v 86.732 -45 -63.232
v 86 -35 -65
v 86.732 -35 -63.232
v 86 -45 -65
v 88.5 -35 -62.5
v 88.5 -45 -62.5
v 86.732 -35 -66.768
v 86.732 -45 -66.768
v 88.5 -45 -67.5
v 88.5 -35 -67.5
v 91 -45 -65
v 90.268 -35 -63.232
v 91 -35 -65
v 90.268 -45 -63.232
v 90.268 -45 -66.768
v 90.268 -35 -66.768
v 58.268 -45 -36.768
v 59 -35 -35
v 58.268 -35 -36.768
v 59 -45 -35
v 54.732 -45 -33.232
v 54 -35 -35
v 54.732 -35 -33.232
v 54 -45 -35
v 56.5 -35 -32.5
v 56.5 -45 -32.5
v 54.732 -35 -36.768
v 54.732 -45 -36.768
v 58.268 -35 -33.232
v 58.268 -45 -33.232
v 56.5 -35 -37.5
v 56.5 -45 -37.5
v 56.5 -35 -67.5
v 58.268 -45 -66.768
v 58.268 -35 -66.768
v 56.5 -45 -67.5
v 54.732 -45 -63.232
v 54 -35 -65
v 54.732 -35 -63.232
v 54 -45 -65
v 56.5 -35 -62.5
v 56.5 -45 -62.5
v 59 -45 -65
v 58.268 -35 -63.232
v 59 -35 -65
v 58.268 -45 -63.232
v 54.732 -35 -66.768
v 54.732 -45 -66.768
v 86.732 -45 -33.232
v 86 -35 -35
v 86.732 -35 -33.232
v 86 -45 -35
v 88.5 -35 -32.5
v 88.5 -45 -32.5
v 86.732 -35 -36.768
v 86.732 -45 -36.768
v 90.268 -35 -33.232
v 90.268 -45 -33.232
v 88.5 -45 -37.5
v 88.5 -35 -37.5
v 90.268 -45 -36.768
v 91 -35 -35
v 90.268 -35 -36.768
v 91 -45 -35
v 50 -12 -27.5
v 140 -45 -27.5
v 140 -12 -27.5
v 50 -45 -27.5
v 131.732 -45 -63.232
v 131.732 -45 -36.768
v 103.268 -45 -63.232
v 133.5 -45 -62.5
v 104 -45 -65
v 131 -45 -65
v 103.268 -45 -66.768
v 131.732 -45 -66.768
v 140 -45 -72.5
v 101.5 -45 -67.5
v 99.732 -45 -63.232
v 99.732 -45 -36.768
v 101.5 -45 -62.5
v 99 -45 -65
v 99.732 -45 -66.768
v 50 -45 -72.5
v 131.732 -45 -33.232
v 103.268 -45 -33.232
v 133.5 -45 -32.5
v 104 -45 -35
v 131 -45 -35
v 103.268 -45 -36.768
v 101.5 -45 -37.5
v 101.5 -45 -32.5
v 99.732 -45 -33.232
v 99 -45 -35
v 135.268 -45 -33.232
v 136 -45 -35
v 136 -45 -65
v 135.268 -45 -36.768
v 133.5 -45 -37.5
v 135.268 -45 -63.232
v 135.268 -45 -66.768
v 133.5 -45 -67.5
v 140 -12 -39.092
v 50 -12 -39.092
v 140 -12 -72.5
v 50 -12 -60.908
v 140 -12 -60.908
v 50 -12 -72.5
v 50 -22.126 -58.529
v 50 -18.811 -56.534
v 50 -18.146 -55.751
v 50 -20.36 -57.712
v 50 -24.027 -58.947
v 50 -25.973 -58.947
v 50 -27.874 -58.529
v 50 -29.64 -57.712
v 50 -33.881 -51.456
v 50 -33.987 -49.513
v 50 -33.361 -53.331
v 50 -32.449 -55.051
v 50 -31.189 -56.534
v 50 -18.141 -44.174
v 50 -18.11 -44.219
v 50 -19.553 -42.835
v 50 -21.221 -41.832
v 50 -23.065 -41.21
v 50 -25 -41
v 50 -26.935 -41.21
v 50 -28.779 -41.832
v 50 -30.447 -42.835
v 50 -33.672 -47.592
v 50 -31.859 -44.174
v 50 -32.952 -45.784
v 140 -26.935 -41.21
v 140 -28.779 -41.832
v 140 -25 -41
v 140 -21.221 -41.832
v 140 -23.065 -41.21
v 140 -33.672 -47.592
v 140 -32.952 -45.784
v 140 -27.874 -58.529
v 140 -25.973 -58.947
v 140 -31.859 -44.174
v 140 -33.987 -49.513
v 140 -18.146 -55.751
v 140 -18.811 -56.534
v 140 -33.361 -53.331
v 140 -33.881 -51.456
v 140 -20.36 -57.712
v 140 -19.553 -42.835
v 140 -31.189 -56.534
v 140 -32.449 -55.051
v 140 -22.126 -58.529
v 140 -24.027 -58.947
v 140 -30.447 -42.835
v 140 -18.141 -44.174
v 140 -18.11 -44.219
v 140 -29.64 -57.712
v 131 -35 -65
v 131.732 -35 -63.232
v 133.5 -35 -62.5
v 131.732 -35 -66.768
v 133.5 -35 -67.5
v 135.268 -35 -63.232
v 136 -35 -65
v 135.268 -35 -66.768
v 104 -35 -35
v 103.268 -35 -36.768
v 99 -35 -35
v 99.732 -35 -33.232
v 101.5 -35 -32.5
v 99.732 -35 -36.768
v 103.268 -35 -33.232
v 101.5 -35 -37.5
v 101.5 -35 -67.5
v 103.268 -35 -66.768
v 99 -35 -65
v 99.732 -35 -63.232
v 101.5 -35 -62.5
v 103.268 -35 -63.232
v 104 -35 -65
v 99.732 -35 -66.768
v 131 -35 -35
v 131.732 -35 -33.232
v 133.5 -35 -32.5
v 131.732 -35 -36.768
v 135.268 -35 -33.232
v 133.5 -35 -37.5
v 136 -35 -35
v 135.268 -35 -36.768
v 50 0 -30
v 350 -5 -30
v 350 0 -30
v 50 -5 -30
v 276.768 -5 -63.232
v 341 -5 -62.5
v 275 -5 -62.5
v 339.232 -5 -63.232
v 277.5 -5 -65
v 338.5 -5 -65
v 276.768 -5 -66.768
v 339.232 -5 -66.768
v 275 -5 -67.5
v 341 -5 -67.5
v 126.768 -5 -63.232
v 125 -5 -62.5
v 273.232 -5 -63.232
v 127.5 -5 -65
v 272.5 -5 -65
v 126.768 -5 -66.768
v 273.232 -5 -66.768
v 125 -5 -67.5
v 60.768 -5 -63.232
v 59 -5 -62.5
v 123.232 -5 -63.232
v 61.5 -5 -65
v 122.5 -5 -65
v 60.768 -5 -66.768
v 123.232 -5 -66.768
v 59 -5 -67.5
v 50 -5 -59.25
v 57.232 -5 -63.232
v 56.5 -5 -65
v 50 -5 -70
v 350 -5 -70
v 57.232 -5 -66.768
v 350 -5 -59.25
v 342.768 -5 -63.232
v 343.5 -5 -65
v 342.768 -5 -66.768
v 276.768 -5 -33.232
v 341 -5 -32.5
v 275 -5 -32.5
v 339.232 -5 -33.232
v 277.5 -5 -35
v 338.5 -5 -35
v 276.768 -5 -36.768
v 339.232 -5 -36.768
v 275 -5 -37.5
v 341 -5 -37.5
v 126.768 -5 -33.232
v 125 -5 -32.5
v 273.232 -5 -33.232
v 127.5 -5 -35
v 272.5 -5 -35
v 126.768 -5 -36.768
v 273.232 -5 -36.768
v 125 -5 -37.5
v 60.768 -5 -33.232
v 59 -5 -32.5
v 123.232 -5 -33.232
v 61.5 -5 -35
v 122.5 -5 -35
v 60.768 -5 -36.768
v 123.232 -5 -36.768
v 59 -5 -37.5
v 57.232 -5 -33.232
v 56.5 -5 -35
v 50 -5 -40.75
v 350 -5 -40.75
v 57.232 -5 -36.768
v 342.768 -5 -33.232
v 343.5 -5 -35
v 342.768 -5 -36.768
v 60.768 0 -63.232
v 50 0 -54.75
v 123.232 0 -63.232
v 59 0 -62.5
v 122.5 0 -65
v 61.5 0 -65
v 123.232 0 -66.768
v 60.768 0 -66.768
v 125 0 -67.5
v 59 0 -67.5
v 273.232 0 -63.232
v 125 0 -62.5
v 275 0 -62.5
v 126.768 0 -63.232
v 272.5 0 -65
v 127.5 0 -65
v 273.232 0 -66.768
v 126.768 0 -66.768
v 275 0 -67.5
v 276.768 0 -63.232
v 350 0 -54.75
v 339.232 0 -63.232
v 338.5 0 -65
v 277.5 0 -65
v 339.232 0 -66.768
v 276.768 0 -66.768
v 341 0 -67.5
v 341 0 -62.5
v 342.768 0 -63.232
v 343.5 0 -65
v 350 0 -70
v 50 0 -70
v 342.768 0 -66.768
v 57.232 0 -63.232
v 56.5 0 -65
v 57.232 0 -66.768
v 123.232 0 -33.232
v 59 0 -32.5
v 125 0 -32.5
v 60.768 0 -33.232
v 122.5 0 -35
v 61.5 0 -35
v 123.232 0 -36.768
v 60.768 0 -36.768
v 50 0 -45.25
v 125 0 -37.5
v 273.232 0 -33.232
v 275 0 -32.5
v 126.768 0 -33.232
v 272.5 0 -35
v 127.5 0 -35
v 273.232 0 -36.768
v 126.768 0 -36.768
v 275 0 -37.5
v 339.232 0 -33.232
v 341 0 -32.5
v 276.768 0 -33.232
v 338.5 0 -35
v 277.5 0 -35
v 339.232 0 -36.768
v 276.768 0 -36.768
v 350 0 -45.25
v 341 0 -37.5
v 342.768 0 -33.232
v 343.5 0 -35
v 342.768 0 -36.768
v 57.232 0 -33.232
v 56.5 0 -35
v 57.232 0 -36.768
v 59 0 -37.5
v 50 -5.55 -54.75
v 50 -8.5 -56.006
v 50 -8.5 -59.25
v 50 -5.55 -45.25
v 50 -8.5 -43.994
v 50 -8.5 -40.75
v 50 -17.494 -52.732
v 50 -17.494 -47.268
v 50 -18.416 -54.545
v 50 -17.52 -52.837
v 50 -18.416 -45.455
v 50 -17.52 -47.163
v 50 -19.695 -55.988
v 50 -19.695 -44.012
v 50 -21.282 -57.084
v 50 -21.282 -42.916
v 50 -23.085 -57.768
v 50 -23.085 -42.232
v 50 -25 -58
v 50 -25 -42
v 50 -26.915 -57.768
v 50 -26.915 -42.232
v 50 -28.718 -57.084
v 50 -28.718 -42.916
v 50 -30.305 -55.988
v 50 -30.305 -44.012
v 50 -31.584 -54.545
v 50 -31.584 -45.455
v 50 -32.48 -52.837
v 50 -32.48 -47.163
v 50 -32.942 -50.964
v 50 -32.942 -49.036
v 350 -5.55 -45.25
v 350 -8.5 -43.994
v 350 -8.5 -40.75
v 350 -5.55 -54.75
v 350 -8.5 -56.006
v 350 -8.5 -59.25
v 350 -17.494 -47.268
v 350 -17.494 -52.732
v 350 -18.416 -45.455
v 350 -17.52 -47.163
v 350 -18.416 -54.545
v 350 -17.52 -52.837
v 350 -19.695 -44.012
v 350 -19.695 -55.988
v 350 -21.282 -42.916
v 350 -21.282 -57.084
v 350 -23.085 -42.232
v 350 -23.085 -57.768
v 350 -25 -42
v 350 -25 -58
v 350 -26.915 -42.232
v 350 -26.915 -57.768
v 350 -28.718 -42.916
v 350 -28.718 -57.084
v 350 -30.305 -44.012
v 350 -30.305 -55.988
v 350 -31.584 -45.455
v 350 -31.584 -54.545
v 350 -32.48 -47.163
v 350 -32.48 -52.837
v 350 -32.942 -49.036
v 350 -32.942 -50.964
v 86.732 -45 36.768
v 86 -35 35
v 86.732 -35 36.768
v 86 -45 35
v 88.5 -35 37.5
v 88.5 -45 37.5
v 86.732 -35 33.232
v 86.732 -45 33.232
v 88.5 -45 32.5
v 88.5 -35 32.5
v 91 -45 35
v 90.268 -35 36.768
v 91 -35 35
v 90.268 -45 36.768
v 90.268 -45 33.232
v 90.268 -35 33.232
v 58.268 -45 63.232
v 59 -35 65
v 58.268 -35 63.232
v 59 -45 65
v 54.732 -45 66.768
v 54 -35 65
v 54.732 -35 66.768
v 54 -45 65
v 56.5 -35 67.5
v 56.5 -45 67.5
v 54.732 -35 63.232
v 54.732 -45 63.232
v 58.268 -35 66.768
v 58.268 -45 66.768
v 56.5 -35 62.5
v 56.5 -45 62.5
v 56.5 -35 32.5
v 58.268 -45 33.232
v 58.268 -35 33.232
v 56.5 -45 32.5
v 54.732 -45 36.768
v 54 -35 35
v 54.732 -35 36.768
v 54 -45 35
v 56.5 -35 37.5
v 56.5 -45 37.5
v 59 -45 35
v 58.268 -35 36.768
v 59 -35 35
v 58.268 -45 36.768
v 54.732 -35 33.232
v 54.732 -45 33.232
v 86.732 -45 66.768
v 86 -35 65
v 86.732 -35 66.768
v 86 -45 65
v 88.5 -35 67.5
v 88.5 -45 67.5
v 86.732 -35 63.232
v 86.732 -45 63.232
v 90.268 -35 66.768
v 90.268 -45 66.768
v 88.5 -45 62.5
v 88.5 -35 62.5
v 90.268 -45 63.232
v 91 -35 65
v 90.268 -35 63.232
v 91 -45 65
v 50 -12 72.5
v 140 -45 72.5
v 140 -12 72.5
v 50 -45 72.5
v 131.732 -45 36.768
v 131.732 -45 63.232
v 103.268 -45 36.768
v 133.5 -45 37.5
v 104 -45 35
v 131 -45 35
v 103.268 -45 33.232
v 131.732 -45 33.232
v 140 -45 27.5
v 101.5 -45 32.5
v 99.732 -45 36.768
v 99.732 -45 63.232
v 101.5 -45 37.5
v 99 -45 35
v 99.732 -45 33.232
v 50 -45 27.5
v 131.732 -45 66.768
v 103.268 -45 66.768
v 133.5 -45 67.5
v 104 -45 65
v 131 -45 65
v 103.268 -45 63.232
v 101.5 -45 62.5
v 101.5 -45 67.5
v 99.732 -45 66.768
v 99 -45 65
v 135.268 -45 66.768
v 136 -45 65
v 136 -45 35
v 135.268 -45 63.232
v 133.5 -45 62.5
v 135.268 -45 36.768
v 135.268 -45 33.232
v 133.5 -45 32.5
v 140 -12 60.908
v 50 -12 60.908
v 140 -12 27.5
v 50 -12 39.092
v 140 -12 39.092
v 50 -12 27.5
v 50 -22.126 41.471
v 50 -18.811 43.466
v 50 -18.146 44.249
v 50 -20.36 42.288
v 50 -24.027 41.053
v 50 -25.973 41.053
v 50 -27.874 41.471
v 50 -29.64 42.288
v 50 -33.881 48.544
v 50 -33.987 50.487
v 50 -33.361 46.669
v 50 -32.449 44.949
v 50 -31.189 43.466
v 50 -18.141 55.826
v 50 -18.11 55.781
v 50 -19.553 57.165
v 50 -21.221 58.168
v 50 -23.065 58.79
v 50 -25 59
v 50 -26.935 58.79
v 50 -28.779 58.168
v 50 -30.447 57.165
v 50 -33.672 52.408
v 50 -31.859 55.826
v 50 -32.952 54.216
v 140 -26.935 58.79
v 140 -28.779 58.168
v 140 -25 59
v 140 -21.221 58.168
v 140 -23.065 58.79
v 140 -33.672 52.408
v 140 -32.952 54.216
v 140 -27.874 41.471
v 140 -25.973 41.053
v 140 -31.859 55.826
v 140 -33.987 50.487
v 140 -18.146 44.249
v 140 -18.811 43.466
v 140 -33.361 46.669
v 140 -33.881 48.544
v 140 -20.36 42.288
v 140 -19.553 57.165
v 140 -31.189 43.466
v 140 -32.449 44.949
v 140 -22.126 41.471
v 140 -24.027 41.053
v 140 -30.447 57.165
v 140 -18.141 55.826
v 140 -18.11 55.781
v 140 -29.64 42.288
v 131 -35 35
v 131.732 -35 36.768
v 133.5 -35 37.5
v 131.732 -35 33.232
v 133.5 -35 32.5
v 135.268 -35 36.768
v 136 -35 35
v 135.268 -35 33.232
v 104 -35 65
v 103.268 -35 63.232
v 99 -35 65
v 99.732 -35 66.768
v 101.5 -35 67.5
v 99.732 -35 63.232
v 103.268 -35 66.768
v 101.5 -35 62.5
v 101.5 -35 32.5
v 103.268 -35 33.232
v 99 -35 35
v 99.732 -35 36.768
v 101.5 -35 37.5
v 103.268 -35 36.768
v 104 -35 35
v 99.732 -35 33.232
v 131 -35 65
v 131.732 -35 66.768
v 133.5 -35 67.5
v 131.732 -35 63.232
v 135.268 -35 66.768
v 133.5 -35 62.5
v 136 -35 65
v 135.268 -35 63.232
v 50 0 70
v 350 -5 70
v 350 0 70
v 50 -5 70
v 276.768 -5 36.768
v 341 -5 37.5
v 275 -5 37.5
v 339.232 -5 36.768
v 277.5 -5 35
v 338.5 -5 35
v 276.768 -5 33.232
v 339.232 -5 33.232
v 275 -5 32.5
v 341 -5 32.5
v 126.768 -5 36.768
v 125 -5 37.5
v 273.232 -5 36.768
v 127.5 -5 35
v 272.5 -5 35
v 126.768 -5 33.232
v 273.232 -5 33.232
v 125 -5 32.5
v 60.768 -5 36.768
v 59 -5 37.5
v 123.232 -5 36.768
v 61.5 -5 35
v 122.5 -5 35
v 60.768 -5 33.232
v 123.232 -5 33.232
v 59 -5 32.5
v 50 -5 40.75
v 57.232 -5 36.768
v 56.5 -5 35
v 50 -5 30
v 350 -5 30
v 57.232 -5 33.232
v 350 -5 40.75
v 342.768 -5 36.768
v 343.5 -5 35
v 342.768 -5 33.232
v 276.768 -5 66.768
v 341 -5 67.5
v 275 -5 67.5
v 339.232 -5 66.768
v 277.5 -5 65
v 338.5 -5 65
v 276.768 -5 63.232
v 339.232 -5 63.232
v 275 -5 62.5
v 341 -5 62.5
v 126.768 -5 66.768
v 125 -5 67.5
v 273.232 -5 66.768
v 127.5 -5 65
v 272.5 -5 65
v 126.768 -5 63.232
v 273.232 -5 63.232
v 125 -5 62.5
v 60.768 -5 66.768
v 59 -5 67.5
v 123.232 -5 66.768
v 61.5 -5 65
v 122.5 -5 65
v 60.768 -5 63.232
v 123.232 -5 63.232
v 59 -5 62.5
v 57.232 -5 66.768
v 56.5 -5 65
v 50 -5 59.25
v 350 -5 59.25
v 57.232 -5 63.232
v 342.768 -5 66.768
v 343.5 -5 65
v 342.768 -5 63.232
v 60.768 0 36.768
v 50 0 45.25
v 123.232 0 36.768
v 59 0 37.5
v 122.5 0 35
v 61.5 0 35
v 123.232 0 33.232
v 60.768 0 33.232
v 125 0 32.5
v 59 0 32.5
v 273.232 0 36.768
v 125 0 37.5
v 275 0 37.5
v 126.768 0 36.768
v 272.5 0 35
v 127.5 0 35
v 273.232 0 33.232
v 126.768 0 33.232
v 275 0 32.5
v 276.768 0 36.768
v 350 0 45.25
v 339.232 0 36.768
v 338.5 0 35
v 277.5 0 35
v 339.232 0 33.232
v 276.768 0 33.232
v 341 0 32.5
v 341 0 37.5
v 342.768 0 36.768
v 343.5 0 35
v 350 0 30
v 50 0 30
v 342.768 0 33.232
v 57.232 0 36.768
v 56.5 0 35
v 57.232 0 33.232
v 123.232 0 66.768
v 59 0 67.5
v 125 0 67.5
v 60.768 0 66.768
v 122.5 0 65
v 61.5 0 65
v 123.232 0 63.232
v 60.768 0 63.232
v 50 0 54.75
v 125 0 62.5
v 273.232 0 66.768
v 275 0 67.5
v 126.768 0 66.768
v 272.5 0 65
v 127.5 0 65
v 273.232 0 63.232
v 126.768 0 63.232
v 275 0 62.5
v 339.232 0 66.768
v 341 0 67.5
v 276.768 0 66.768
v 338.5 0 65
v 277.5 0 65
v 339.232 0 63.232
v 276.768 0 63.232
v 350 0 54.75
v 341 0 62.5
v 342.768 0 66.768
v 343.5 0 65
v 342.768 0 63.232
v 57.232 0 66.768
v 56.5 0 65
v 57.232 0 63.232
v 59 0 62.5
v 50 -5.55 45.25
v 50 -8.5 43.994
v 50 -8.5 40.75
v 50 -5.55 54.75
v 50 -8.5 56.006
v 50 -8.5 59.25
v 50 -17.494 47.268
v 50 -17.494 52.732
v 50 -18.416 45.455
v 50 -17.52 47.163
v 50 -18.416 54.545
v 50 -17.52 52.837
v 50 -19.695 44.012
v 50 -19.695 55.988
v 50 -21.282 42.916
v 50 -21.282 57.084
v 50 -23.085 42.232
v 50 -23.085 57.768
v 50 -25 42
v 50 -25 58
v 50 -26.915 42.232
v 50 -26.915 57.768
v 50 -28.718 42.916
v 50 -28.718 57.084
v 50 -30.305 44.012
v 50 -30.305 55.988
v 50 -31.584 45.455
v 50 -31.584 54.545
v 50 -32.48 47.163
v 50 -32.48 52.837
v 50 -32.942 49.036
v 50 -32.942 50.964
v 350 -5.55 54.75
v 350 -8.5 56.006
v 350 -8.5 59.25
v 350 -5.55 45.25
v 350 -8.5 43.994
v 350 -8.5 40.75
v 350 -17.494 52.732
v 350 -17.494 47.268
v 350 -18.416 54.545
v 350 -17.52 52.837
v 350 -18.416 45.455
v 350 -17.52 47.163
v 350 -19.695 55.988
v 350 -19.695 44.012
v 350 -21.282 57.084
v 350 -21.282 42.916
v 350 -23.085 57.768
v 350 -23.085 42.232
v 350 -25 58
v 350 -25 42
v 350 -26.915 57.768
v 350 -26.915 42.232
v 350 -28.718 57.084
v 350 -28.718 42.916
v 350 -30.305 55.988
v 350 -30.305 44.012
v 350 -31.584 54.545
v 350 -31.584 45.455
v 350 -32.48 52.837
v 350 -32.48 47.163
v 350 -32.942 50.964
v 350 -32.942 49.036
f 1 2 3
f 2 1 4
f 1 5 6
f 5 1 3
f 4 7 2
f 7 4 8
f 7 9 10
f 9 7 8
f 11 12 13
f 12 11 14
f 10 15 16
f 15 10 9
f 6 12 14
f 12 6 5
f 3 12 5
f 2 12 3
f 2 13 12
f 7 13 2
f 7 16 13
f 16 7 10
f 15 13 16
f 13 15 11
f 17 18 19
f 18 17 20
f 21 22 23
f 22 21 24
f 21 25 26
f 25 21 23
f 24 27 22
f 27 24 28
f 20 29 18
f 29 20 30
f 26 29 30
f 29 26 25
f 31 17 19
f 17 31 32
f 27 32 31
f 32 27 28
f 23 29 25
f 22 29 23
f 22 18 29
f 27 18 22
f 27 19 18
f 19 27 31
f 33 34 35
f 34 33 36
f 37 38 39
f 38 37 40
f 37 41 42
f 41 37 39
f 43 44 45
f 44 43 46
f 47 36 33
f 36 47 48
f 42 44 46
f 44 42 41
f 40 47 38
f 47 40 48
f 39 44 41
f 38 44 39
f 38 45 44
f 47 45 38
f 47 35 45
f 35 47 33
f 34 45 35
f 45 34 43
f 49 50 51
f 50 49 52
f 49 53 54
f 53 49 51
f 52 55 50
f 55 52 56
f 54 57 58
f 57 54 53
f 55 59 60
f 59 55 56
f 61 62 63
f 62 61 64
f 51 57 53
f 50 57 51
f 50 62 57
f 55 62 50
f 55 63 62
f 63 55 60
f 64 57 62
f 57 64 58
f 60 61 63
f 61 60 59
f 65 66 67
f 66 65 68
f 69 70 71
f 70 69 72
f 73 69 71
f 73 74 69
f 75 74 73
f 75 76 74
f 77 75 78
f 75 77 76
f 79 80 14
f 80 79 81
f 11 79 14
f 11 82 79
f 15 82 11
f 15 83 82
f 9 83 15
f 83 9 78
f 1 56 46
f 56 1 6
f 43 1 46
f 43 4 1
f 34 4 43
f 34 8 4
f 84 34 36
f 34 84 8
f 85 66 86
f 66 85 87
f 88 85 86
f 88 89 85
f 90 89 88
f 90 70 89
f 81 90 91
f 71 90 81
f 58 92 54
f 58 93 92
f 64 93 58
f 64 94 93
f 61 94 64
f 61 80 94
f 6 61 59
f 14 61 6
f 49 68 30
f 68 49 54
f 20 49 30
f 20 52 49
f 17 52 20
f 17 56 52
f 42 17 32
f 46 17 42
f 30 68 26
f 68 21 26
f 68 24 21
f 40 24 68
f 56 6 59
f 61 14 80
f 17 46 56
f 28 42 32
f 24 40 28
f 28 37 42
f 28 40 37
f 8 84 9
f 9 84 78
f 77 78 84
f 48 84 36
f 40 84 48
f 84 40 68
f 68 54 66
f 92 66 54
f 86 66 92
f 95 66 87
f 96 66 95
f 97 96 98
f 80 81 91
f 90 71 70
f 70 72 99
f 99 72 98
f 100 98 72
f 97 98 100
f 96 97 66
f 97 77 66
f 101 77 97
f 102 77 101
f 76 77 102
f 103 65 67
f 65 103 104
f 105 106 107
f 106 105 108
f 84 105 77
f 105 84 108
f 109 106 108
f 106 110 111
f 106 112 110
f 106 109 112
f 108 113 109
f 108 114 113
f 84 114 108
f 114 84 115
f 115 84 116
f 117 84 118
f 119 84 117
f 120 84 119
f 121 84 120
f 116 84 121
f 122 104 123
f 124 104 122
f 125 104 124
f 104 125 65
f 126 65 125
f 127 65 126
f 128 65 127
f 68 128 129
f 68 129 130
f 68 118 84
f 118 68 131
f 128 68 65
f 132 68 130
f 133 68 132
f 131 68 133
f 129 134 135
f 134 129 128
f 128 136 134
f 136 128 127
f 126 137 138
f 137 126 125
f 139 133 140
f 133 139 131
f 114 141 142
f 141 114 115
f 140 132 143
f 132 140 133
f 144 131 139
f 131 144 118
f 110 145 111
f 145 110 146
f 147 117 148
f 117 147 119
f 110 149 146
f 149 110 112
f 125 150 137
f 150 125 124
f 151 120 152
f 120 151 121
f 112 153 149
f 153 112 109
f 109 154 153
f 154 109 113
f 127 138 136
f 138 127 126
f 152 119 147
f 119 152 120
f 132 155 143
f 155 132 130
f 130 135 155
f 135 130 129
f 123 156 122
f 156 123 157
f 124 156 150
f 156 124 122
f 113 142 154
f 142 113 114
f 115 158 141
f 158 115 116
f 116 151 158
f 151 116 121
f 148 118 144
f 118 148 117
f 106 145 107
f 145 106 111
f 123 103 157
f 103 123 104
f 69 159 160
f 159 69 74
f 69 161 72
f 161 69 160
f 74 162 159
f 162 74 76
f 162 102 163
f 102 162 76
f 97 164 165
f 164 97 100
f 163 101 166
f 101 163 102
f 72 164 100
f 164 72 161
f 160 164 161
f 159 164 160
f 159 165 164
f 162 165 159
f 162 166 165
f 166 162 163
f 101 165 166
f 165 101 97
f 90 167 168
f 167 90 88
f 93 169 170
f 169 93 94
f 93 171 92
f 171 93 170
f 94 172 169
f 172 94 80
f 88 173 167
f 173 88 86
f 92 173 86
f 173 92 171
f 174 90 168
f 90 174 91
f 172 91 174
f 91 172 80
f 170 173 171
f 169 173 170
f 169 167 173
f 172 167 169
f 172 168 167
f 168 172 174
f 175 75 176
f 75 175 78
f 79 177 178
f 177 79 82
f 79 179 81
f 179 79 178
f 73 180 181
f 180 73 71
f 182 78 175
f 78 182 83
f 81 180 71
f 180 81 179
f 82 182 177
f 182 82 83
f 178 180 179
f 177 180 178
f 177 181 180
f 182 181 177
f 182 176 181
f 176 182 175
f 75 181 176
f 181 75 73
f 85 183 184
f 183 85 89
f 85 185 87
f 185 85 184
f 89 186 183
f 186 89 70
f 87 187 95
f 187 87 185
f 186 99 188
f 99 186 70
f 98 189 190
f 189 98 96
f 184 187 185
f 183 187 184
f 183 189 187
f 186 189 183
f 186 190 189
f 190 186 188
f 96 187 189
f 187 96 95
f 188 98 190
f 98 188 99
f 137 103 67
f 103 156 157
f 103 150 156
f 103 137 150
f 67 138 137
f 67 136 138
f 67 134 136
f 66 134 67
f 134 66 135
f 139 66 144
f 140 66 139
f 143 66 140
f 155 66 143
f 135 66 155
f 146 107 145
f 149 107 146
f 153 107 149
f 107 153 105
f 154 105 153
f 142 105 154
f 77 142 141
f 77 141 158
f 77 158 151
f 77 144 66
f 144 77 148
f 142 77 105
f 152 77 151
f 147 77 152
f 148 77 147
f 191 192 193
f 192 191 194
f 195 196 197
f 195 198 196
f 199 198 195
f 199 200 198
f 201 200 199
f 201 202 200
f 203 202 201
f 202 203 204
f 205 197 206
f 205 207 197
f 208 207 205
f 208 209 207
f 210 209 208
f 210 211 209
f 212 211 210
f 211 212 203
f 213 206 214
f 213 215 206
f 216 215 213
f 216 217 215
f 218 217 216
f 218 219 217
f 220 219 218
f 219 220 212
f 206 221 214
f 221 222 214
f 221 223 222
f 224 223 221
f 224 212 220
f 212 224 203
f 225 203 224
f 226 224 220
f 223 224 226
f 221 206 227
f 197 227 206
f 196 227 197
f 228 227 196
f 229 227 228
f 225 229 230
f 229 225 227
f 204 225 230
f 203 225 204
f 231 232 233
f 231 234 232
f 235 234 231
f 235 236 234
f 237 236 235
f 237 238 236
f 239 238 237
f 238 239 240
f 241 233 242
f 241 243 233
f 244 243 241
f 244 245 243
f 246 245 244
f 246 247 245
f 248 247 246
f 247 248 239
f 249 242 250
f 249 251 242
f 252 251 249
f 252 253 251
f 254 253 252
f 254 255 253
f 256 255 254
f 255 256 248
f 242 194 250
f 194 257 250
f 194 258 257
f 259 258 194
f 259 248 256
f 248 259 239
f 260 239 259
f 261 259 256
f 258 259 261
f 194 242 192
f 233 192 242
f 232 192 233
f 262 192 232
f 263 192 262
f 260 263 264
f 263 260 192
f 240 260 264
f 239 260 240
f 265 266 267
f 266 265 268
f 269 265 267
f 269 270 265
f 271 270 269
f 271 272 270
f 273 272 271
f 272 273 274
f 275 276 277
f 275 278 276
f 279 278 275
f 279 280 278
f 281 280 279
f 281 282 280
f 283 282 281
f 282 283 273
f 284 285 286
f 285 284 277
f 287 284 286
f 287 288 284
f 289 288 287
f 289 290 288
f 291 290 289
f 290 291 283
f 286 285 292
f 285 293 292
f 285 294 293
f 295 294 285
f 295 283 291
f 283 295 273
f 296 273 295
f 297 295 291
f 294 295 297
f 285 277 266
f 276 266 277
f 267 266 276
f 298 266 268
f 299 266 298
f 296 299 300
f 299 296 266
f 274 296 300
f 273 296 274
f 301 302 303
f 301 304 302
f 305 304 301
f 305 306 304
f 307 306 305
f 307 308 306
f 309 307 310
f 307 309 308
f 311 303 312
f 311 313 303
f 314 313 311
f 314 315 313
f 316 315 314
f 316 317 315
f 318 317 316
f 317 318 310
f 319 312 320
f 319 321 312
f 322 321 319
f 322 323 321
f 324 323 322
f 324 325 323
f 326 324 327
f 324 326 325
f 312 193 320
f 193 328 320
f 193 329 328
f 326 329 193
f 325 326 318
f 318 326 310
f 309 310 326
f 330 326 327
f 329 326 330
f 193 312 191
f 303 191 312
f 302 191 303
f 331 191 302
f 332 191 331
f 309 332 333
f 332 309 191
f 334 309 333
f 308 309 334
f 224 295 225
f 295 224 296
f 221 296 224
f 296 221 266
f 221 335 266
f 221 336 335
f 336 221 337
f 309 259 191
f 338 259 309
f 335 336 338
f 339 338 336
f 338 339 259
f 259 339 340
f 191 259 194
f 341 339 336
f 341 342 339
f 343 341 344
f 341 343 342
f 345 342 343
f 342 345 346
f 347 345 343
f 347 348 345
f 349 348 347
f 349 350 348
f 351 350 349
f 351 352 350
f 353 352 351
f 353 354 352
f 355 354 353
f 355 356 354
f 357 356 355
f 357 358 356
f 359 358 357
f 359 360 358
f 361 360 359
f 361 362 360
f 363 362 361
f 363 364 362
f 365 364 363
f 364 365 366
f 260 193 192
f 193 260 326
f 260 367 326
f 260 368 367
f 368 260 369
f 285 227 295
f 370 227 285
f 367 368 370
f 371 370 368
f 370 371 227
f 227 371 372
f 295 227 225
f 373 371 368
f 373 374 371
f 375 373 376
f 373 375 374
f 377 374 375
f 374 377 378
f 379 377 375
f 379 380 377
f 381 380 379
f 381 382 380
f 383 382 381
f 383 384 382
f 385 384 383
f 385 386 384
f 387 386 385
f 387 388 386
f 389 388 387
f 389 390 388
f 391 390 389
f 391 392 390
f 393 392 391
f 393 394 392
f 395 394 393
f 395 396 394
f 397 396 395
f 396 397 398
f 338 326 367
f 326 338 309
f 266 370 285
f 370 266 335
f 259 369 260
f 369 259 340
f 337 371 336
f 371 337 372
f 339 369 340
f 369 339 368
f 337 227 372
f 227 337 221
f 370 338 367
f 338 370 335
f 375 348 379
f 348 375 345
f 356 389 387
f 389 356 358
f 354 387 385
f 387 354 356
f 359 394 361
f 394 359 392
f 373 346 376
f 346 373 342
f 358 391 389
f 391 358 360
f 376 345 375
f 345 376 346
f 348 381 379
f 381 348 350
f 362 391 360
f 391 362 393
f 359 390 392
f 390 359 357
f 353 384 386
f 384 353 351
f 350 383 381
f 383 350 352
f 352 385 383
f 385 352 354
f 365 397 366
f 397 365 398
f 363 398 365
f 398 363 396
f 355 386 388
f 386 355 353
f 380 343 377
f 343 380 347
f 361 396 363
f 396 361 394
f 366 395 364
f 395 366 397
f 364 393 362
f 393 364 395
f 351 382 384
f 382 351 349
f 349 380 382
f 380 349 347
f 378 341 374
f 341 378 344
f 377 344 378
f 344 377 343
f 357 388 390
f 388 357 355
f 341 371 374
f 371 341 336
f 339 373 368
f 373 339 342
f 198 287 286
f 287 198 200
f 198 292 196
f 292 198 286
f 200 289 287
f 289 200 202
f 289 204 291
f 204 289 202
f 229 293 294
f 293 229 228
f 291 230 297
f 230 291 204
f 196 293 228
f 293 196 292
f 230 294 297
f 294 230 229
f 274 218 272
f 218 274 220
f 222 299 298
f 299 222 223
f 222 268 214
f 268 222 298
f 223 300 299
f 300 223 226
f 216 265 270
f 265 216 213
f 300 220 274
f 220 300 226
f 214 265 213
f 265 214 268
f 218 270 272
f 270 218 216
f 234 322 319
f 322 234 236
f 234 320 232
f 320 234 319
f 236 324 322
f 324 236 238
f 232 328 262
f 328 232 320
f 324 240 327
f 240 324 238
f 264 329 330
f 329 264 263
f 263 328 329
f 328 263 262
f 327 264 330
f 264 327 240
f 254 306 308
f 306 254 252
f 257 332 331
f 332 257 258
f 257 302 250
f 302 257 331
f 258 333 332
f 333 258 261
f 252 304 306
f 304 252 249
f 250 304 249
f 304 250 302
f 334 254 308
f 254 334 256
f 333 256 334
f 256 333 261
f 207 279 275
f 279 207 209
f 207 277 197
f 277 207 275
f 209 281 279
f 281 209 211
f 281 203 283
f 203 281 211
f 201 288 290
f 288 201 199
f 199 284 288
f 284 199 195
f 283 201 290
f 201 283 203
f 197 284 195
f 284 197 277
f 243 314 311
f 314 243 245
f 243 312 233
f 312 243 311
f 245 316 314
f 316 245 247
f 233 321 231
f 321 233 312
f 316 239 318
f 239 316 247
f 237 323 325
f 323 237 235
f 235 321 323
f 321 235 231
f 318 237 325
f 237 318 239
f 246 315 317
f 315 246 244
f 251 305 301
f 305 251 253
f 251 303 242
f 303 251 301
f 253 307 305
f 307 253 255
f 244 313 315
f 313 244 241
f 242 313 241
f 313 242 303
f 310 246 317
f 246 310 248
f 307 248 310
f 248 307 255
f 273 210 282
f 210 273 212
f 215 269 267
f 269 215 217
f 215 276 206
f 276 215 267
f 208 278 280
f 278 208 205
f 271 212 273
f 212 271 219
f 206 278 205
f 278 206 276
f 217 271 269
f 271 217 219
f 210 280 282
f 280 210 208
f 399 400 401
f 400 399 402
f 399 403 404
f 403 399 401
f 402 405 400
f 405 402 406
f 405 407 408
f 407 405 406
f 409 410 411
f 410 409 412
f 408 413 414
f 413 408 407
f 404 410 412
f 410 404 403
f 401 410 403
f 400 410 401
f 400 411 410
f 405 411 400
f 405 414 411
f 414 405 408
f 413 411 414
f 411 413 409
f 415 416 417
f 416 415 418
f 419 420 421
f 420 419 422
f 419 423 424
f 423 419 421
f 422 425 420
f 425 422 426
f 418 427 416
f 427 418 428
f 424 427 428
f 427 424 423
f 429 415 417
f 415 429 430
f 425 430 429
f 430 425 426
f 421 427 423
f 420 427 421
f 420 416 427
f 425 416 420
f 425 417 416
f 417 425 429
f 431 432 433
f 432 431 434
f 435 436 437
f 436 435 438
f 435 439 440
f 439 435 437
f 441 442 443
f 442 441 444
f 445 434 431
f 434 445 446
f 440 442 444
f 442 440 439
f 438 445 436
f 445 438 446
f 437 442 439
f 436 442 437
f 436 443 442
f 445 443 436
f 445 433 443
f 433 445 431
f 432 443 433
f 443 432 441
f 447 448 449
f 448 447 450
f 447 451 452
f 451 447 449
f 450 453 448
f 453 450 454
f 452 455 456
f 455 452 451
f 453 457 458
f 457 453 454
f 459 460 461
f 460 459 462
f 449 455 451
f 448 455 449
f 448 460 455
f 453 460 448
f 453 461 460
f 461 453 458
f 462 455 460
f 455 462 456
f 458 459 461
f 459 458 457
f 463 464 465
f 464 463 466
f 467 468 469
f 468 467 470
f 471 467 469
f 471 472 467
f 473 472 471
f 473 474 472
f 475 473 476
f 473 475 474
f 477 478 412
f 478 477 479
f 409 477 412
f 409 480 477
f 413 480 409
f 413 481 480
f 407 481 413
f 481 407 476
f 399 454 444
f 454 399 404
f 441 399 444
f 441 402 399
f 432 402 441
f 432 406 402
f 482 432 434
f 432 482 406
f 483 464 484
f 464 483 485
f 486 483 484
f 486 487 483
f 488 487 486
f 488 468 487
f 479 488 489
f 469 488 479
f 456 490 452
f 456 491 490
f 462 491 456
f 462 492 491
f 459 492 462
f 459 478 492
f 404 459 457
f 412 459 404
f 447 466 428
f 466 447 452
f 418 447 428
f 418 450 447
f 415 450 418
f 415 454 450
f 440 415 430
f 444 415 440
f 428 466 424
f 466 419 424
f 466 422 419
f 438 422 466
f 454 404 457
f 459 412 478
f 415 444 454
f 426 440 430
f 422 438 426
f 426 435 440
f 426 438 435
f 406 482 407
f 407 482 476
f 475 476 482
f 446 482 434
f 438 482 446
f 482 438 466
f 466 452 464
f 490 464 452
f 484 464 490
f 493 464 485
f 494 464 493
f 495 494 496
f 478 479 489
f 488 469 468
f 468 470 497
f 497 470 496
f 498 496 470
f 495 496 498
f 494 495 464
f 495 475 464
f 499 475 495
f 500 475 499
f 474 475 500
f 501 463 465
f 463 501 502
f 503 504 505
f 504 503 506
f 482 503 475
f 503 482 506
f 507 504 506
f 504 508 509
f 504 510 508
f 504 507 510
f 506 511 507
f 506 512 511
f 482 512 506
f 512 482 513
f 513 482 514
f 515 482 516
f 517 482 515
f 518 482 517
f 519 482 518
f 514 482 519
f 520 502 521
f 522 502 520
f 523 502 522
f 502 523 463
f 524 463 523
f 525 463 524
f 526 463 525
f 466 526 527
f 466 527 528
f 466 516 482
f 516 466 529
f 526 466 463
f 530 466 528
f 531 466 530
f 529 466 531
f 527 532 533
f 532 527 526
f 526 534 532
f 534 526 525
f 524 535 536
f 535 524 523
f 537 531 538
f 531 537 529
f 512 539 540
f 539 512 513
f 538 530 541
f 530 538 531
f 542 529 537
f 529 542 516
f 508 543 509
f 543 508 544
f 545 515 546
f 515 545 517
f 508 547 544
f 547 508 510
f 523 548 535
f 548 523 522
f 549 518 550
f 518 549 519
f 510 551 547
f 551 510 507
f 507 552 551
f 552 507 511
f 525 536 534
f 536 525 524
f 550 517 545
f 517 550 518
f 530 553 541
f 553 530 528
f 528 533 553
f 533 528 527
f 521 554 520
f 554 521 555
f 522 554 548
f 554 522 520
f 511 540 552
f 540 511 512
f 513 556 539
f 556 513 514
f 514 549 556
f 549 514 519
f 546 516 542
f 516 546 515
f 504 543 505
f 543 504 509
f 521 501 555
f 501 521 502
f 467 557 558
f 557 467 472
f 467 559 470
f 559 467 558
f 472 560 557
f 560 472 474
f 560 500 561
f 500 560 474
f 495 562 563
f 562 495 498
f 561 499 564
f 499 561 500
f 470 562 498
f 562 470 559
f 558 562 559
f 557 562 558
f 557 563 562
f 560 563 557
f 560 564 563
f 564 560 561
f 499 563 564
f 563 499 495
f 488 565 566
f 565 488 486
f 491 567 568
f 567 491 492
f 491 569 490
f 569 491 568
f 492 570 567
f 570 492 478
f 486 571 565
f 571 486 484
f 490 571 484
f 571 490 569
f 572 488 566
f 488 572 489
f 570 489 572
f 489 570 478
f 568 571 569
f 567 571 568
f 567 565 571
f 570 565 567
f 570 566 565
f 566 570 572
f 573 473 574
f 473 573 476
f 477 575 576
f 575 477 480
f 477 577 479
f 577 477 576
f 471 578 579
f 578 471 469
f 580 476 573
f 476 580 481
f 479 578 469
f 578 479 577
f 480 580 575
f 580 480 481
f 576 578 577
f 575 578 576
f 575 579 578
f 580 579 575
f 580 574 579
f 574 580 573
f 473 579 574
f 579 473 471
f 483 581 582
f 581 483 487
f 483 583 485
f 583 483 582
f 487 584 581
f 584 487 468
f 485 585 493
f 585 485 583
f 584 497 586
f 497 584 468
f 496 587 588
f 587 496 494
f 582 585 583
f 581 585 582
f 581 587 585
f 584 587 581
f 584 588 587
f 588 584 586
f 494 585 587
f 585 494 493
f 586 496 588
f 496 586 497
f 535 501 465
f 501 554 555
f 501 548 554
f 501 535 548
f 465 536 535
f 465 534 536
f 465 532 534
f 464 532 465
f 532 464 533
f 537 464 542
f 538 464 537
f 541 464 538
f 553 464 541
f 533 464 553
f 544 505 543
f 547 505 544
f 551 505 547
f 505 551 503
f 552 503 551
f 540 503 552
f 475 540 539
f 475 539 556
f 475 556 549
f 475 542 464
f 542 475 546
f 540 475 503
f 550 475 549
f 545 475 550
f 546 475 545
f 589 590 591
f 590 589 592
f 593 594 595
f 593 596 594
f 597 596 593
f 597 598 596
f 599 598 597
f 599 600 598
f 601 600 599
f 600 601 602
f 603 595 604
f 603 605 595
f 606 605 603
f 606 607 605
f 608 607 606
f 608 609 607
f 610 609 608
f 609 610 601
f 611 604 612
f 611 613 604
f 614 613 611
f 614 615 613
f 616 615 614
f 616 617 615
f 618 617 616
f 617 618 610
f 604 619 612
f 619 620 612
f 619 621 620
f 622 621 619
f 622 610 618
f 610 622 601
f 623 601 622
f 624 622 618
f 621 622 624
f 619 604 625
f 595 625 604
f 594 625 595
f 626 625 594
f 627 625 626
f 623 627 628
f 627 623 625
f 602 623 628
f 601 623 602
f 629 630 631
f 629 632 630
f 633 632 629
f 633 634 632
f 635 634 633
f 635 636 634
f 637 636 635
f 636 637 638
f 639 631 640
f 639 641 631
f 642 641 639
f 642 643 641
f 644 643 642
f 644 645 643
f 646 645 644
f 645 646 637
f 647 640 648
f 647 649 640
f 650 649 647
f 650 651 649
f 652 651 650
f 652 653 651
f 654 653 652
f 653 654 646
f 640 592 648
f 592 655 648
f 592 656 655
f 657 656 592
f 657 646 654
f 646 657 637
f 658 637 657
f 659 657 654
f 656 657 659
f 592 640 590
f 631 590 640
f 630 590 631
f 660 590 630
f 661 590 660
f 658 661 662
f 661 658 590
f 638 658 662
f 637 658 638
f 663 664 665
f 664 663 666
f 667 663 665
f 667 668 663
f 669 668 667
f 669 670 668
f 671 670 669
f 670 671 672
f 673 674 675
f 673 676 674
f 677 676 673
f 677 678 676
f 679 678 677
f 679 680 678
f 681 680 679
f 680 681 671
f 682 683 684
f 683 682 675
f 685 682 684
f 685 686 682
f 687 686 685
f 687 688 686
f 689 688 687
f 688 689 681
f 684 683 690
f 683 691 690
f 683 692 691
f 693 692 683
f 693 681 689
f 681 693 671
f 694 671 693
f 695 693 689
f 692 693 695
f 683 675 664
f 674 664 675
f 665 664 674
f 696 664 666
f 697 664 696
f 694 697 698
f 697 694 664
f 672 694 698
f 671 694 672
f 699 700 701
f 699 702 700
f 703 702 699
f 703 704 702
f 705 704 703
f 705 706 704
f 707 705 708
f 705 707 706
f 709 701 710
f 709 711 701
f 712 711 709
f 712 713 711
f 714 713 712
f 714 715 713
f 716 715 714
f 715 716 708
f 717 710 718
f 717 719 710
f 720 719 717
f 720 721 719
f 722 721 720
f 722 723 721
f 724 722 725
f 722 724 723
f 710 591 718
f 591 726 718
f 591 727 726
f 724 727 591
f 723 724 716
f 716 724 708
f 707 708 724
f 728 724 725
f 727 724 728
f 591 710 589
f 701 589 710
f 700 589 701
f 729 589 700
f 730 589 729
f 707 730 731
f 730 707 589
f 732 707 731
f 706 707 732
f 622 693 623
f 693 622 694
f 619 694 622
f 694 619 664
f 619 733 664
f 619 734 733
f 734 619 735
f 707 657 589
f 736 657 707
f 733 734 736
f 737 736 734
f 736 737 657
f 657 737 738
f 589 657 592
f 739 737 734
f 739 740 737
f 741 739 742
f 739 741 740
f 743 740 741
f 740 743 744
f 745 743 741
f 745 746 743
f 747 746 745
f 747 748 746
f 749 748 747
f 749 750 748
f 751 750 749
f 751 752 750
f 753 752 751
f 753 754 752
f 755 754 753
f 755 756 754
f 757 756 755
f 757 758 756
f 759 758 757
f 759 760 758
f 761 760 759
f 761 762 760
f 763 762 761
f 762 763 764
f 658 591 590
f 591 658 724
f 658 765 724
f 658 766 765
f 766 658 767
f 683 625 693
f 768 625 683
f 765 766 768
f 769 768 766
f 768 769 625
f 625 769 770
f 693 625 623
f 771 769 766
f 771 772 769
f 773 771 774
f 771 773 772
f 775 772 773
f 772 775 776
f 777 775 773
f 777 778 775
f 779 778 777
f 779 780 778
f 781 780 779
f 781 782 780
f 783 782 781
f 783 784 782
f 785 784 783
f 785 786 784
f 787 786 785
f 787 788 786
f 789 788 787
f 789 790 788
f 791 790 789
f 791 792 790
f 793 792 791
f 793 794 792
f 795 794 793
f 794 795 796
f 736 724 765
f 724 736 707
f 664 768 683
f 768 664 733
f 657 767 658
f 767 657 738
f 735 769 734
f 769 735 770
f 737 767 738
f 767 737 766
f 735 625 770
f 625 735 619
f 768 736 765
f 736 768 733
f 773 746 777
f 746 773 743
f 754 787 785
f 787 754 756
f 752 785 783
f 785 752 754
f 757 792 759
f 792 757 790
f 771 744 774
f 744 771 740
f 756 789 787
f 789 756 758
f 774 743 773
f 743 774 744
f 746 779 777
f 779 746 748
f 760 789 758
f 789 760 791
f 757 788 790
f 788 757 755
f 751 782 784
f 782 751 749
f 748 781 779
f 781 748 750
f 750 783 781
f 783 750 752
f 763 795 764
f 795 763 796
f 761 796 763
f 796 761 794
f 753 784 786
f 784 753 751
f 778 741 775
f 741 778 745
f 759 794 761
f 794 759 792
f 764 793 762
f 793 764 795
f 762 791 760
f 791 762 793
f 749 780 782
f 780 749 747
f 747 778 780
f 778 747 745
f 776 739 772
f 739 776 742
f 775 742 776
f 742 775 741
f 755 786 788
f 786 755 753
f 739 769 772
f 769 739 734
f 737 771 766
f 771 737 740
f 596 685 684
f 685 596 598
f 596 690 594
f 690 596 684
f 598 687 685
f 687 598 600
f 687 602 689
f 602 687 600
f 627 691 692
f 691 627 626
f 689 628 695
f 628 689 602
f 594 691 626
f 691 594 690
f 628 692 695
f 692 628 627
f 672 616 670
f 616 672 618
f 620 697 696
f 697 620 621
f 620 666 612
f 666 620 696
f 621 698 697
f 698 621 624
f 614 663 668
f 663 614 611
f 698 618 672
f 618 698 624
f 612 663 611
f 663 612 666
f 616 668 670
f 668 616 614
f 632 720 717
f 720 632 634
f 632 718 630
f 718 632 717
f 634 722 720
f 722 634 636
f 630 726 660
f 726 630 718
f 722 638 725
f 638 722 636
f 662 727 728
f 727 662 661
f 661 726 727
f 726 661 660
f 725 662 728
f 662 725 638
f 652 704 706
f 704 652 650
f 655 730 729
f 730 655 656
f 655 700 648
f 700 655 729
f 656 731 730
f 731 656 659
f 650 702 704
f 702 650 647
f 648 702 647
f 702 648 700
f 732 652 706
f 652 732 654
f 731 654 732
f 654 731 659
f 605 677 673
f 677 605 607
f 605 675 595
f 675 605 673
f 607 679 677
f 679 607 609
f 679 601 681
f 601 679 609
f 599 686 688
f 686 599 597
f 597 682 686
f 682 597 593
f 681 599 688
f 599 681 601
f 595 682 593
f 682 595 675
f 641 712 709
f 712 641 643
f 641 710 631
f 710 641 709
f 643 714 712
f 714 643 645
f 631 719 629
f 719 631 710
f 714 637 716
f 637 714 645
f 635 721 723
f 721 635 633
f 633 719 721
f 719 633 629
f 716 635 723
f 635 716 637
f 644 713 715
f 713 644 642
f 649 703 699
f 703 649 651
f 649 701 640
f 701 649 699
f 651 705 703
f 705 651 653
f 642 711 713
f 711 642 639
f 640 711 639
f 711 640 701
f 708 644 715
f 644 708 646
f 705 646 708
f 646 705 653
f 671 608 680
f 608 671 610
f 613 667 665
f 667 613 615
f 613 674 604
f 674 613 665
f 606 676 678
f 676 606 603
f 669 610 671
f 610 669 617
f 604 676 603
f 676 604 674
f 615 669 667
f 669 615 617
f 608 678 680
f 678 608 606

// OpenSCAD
// file: SBR16.scad
function SBR16UU_size() = 45;
function assembled_rail_height() = 45;

module SBR16UU() {
	color([.9,.9,.9]) {
		difference() {
			// main body
			translate([0,0,-16.5]) {
				cube(size = [SBR16UU_size(), SBR16UU_size(), 33], center = true);
			}
			// mounting holes (m5, rectangle 30x32)
			translate([0,0,-10]) {
				translate([-15,-16,0]) {
					cylinder(r=2.5,h=11,center=false);
				}
				translate([15,16,0]) {
					cylinder(r=2.5,h=11,center=false);
				}
				translate([-15,16,0]) {
					cylinder(r=2.5,h=11,center=false);
				}
				translate([15,-16,0]) {
					cylinder(r=2.5,h=11,center=false);
				}
			}
			// the rail
			translate([0,0,-20]) {
				rotate([90,0,0]) {
					// NB the real radius is r=8, 9 was set for better rendering
					//				cylinder(r=8,h=46,center=true);
					cylinder(r=9,h=46,center=true);
				}
			}
			// the cut
			translate([0,0,-20]) {
				rotate([0,180,0]) {
					polyhedron ( points = [[0, -23, 0], [0, 23, 0], [33*sin(40), 23, 33*cos(40)], [33*sin(40), -23, 33*cos(40)], [33*sin(-40), -23, 33*cos(40)], [33*sin(-40), 23, 33*cos(40)]],
							triangles = [[0,3,2], [0,2,1], [3,0,4], [1,2,5], [0,5,4], [0,1,5],  [5,2,4], [4,2,3], ]);
				}
			}
		}
	}
}


module SBR16_rail_normalized() {
	color([.8,.8,.8]) {
		difference() {
			translate([0,0,2.5]) {
				cube(size = [40,1,5], center = true);
			}
			translate([0,0,2.75]) {
				cube(size = [9.5,1.5,5.6], center = true);
			}
		}
		difference() {
			translate([0,0,4.25]) {
				cube(size = [18.5,1,8.5], center = true);
			}
			translate([0,0,2.75]) {
				cube(size = [9.5,1.5,5.6], center = true);
			}
		}

		translate([0,0,25]) {
			rotate([90,0,0]) {
				cylinder(r=8,h=1,center=true);
			}

			rotate([0,180,0]) {
				polyhedron ( points = [[0, -.5, 0], [0, .5, 0], [18*sin(20), .5, 18*cos(20)], [18*sin(20), -.5, 18*cos(20)], [18*sin(-20), -.5, 18*cos(20)], [18*sin(-20), .5, 18*cos(20)]],
						triangles = [[0,3,2], [0,2,1], [3,0,4], [1,2,5], [0,5,4], [0,1,5],  [5,2,4], [4,2,3], ]);
			}
		}
	}
}
// main file
use <SBR16.scad>;

function yposition() = $t*210; // valid range 0-210
function xplates_thickness() = 15;

function xrails_spacing() = 100;
function xrails_length()  = 300;
function xplate_width() = 400;

module xrail() {
	translate([0,-yposition()+xrails_length()/2-SBR16UU_size()/2,assembled_rail_height()]) {
		translate([0,-SBR16UU_size(),0]) {
			SBR16UU();
		}
		SBR16UU();
	}
	difference() {
		scale([1, xrails_length(), 1]) {
			SBR16_rail_normalized();
		}
		// mounting holes
		translate([-15,-141,0]) {
			cylinder(r=2.5,h=6,center=false);
		}
		translate([-15,141,0]) {
			cylinder(r=2.5,h=6,center=false);
		}
		translate([15,-141,0]) {
			cylinder(r=2.5,h=6,center=false);
		}
		translate([15,141,0]) {
			cylinder(r=2.5,h=6,center=false);
		}
		translate([-15,-75,0]) {
			cylinder(r=2.5,h=6,center=false);
		}
		translate([15,-75,0]) {
			cylinder(r=2.5,h=6,center=false);
		}
		translate([15,75,0]) {
			cylinder(r=2.5,h=6,center=false);
		}
		translate([-15,75,0]) {
			cylinder(r=2.5,h=6,center=false);
		}
	}
}

module xzplate() {
	translate([yposition(),-xplates_thickness()-assembled_rail_height(),0]) {
		rotate([90,0,0]) {
			translate([0,0,-xplates_thickness()/2]) {
				dxf_linear_extrude(file="dxf/xaxis.dxf",layer="1",height=xplates_thickness(),center=true,$fn=100);
			}
		}
	}
}

module xaxis() {
	rotate([90,0,0]) {
		translate([0,0,-xplates_thickness()/2]) {
			dxf_linear_extrude(file="dxf/xaxis.dxf",layer="0",height=xplates_thickness(),center=true,$fn=100);
		}
	}
	xzplate();
	translate([xplate_width()/2,0,0]) {
		rotate([0,-90,90]) {
			translate([-xrails_spacing()/2,0,0]) {
				xrail();
			}
			translate([xrails_spacing()/2,0,0]) {
				xrail();
			}
		}
	}
}

xaxis();
